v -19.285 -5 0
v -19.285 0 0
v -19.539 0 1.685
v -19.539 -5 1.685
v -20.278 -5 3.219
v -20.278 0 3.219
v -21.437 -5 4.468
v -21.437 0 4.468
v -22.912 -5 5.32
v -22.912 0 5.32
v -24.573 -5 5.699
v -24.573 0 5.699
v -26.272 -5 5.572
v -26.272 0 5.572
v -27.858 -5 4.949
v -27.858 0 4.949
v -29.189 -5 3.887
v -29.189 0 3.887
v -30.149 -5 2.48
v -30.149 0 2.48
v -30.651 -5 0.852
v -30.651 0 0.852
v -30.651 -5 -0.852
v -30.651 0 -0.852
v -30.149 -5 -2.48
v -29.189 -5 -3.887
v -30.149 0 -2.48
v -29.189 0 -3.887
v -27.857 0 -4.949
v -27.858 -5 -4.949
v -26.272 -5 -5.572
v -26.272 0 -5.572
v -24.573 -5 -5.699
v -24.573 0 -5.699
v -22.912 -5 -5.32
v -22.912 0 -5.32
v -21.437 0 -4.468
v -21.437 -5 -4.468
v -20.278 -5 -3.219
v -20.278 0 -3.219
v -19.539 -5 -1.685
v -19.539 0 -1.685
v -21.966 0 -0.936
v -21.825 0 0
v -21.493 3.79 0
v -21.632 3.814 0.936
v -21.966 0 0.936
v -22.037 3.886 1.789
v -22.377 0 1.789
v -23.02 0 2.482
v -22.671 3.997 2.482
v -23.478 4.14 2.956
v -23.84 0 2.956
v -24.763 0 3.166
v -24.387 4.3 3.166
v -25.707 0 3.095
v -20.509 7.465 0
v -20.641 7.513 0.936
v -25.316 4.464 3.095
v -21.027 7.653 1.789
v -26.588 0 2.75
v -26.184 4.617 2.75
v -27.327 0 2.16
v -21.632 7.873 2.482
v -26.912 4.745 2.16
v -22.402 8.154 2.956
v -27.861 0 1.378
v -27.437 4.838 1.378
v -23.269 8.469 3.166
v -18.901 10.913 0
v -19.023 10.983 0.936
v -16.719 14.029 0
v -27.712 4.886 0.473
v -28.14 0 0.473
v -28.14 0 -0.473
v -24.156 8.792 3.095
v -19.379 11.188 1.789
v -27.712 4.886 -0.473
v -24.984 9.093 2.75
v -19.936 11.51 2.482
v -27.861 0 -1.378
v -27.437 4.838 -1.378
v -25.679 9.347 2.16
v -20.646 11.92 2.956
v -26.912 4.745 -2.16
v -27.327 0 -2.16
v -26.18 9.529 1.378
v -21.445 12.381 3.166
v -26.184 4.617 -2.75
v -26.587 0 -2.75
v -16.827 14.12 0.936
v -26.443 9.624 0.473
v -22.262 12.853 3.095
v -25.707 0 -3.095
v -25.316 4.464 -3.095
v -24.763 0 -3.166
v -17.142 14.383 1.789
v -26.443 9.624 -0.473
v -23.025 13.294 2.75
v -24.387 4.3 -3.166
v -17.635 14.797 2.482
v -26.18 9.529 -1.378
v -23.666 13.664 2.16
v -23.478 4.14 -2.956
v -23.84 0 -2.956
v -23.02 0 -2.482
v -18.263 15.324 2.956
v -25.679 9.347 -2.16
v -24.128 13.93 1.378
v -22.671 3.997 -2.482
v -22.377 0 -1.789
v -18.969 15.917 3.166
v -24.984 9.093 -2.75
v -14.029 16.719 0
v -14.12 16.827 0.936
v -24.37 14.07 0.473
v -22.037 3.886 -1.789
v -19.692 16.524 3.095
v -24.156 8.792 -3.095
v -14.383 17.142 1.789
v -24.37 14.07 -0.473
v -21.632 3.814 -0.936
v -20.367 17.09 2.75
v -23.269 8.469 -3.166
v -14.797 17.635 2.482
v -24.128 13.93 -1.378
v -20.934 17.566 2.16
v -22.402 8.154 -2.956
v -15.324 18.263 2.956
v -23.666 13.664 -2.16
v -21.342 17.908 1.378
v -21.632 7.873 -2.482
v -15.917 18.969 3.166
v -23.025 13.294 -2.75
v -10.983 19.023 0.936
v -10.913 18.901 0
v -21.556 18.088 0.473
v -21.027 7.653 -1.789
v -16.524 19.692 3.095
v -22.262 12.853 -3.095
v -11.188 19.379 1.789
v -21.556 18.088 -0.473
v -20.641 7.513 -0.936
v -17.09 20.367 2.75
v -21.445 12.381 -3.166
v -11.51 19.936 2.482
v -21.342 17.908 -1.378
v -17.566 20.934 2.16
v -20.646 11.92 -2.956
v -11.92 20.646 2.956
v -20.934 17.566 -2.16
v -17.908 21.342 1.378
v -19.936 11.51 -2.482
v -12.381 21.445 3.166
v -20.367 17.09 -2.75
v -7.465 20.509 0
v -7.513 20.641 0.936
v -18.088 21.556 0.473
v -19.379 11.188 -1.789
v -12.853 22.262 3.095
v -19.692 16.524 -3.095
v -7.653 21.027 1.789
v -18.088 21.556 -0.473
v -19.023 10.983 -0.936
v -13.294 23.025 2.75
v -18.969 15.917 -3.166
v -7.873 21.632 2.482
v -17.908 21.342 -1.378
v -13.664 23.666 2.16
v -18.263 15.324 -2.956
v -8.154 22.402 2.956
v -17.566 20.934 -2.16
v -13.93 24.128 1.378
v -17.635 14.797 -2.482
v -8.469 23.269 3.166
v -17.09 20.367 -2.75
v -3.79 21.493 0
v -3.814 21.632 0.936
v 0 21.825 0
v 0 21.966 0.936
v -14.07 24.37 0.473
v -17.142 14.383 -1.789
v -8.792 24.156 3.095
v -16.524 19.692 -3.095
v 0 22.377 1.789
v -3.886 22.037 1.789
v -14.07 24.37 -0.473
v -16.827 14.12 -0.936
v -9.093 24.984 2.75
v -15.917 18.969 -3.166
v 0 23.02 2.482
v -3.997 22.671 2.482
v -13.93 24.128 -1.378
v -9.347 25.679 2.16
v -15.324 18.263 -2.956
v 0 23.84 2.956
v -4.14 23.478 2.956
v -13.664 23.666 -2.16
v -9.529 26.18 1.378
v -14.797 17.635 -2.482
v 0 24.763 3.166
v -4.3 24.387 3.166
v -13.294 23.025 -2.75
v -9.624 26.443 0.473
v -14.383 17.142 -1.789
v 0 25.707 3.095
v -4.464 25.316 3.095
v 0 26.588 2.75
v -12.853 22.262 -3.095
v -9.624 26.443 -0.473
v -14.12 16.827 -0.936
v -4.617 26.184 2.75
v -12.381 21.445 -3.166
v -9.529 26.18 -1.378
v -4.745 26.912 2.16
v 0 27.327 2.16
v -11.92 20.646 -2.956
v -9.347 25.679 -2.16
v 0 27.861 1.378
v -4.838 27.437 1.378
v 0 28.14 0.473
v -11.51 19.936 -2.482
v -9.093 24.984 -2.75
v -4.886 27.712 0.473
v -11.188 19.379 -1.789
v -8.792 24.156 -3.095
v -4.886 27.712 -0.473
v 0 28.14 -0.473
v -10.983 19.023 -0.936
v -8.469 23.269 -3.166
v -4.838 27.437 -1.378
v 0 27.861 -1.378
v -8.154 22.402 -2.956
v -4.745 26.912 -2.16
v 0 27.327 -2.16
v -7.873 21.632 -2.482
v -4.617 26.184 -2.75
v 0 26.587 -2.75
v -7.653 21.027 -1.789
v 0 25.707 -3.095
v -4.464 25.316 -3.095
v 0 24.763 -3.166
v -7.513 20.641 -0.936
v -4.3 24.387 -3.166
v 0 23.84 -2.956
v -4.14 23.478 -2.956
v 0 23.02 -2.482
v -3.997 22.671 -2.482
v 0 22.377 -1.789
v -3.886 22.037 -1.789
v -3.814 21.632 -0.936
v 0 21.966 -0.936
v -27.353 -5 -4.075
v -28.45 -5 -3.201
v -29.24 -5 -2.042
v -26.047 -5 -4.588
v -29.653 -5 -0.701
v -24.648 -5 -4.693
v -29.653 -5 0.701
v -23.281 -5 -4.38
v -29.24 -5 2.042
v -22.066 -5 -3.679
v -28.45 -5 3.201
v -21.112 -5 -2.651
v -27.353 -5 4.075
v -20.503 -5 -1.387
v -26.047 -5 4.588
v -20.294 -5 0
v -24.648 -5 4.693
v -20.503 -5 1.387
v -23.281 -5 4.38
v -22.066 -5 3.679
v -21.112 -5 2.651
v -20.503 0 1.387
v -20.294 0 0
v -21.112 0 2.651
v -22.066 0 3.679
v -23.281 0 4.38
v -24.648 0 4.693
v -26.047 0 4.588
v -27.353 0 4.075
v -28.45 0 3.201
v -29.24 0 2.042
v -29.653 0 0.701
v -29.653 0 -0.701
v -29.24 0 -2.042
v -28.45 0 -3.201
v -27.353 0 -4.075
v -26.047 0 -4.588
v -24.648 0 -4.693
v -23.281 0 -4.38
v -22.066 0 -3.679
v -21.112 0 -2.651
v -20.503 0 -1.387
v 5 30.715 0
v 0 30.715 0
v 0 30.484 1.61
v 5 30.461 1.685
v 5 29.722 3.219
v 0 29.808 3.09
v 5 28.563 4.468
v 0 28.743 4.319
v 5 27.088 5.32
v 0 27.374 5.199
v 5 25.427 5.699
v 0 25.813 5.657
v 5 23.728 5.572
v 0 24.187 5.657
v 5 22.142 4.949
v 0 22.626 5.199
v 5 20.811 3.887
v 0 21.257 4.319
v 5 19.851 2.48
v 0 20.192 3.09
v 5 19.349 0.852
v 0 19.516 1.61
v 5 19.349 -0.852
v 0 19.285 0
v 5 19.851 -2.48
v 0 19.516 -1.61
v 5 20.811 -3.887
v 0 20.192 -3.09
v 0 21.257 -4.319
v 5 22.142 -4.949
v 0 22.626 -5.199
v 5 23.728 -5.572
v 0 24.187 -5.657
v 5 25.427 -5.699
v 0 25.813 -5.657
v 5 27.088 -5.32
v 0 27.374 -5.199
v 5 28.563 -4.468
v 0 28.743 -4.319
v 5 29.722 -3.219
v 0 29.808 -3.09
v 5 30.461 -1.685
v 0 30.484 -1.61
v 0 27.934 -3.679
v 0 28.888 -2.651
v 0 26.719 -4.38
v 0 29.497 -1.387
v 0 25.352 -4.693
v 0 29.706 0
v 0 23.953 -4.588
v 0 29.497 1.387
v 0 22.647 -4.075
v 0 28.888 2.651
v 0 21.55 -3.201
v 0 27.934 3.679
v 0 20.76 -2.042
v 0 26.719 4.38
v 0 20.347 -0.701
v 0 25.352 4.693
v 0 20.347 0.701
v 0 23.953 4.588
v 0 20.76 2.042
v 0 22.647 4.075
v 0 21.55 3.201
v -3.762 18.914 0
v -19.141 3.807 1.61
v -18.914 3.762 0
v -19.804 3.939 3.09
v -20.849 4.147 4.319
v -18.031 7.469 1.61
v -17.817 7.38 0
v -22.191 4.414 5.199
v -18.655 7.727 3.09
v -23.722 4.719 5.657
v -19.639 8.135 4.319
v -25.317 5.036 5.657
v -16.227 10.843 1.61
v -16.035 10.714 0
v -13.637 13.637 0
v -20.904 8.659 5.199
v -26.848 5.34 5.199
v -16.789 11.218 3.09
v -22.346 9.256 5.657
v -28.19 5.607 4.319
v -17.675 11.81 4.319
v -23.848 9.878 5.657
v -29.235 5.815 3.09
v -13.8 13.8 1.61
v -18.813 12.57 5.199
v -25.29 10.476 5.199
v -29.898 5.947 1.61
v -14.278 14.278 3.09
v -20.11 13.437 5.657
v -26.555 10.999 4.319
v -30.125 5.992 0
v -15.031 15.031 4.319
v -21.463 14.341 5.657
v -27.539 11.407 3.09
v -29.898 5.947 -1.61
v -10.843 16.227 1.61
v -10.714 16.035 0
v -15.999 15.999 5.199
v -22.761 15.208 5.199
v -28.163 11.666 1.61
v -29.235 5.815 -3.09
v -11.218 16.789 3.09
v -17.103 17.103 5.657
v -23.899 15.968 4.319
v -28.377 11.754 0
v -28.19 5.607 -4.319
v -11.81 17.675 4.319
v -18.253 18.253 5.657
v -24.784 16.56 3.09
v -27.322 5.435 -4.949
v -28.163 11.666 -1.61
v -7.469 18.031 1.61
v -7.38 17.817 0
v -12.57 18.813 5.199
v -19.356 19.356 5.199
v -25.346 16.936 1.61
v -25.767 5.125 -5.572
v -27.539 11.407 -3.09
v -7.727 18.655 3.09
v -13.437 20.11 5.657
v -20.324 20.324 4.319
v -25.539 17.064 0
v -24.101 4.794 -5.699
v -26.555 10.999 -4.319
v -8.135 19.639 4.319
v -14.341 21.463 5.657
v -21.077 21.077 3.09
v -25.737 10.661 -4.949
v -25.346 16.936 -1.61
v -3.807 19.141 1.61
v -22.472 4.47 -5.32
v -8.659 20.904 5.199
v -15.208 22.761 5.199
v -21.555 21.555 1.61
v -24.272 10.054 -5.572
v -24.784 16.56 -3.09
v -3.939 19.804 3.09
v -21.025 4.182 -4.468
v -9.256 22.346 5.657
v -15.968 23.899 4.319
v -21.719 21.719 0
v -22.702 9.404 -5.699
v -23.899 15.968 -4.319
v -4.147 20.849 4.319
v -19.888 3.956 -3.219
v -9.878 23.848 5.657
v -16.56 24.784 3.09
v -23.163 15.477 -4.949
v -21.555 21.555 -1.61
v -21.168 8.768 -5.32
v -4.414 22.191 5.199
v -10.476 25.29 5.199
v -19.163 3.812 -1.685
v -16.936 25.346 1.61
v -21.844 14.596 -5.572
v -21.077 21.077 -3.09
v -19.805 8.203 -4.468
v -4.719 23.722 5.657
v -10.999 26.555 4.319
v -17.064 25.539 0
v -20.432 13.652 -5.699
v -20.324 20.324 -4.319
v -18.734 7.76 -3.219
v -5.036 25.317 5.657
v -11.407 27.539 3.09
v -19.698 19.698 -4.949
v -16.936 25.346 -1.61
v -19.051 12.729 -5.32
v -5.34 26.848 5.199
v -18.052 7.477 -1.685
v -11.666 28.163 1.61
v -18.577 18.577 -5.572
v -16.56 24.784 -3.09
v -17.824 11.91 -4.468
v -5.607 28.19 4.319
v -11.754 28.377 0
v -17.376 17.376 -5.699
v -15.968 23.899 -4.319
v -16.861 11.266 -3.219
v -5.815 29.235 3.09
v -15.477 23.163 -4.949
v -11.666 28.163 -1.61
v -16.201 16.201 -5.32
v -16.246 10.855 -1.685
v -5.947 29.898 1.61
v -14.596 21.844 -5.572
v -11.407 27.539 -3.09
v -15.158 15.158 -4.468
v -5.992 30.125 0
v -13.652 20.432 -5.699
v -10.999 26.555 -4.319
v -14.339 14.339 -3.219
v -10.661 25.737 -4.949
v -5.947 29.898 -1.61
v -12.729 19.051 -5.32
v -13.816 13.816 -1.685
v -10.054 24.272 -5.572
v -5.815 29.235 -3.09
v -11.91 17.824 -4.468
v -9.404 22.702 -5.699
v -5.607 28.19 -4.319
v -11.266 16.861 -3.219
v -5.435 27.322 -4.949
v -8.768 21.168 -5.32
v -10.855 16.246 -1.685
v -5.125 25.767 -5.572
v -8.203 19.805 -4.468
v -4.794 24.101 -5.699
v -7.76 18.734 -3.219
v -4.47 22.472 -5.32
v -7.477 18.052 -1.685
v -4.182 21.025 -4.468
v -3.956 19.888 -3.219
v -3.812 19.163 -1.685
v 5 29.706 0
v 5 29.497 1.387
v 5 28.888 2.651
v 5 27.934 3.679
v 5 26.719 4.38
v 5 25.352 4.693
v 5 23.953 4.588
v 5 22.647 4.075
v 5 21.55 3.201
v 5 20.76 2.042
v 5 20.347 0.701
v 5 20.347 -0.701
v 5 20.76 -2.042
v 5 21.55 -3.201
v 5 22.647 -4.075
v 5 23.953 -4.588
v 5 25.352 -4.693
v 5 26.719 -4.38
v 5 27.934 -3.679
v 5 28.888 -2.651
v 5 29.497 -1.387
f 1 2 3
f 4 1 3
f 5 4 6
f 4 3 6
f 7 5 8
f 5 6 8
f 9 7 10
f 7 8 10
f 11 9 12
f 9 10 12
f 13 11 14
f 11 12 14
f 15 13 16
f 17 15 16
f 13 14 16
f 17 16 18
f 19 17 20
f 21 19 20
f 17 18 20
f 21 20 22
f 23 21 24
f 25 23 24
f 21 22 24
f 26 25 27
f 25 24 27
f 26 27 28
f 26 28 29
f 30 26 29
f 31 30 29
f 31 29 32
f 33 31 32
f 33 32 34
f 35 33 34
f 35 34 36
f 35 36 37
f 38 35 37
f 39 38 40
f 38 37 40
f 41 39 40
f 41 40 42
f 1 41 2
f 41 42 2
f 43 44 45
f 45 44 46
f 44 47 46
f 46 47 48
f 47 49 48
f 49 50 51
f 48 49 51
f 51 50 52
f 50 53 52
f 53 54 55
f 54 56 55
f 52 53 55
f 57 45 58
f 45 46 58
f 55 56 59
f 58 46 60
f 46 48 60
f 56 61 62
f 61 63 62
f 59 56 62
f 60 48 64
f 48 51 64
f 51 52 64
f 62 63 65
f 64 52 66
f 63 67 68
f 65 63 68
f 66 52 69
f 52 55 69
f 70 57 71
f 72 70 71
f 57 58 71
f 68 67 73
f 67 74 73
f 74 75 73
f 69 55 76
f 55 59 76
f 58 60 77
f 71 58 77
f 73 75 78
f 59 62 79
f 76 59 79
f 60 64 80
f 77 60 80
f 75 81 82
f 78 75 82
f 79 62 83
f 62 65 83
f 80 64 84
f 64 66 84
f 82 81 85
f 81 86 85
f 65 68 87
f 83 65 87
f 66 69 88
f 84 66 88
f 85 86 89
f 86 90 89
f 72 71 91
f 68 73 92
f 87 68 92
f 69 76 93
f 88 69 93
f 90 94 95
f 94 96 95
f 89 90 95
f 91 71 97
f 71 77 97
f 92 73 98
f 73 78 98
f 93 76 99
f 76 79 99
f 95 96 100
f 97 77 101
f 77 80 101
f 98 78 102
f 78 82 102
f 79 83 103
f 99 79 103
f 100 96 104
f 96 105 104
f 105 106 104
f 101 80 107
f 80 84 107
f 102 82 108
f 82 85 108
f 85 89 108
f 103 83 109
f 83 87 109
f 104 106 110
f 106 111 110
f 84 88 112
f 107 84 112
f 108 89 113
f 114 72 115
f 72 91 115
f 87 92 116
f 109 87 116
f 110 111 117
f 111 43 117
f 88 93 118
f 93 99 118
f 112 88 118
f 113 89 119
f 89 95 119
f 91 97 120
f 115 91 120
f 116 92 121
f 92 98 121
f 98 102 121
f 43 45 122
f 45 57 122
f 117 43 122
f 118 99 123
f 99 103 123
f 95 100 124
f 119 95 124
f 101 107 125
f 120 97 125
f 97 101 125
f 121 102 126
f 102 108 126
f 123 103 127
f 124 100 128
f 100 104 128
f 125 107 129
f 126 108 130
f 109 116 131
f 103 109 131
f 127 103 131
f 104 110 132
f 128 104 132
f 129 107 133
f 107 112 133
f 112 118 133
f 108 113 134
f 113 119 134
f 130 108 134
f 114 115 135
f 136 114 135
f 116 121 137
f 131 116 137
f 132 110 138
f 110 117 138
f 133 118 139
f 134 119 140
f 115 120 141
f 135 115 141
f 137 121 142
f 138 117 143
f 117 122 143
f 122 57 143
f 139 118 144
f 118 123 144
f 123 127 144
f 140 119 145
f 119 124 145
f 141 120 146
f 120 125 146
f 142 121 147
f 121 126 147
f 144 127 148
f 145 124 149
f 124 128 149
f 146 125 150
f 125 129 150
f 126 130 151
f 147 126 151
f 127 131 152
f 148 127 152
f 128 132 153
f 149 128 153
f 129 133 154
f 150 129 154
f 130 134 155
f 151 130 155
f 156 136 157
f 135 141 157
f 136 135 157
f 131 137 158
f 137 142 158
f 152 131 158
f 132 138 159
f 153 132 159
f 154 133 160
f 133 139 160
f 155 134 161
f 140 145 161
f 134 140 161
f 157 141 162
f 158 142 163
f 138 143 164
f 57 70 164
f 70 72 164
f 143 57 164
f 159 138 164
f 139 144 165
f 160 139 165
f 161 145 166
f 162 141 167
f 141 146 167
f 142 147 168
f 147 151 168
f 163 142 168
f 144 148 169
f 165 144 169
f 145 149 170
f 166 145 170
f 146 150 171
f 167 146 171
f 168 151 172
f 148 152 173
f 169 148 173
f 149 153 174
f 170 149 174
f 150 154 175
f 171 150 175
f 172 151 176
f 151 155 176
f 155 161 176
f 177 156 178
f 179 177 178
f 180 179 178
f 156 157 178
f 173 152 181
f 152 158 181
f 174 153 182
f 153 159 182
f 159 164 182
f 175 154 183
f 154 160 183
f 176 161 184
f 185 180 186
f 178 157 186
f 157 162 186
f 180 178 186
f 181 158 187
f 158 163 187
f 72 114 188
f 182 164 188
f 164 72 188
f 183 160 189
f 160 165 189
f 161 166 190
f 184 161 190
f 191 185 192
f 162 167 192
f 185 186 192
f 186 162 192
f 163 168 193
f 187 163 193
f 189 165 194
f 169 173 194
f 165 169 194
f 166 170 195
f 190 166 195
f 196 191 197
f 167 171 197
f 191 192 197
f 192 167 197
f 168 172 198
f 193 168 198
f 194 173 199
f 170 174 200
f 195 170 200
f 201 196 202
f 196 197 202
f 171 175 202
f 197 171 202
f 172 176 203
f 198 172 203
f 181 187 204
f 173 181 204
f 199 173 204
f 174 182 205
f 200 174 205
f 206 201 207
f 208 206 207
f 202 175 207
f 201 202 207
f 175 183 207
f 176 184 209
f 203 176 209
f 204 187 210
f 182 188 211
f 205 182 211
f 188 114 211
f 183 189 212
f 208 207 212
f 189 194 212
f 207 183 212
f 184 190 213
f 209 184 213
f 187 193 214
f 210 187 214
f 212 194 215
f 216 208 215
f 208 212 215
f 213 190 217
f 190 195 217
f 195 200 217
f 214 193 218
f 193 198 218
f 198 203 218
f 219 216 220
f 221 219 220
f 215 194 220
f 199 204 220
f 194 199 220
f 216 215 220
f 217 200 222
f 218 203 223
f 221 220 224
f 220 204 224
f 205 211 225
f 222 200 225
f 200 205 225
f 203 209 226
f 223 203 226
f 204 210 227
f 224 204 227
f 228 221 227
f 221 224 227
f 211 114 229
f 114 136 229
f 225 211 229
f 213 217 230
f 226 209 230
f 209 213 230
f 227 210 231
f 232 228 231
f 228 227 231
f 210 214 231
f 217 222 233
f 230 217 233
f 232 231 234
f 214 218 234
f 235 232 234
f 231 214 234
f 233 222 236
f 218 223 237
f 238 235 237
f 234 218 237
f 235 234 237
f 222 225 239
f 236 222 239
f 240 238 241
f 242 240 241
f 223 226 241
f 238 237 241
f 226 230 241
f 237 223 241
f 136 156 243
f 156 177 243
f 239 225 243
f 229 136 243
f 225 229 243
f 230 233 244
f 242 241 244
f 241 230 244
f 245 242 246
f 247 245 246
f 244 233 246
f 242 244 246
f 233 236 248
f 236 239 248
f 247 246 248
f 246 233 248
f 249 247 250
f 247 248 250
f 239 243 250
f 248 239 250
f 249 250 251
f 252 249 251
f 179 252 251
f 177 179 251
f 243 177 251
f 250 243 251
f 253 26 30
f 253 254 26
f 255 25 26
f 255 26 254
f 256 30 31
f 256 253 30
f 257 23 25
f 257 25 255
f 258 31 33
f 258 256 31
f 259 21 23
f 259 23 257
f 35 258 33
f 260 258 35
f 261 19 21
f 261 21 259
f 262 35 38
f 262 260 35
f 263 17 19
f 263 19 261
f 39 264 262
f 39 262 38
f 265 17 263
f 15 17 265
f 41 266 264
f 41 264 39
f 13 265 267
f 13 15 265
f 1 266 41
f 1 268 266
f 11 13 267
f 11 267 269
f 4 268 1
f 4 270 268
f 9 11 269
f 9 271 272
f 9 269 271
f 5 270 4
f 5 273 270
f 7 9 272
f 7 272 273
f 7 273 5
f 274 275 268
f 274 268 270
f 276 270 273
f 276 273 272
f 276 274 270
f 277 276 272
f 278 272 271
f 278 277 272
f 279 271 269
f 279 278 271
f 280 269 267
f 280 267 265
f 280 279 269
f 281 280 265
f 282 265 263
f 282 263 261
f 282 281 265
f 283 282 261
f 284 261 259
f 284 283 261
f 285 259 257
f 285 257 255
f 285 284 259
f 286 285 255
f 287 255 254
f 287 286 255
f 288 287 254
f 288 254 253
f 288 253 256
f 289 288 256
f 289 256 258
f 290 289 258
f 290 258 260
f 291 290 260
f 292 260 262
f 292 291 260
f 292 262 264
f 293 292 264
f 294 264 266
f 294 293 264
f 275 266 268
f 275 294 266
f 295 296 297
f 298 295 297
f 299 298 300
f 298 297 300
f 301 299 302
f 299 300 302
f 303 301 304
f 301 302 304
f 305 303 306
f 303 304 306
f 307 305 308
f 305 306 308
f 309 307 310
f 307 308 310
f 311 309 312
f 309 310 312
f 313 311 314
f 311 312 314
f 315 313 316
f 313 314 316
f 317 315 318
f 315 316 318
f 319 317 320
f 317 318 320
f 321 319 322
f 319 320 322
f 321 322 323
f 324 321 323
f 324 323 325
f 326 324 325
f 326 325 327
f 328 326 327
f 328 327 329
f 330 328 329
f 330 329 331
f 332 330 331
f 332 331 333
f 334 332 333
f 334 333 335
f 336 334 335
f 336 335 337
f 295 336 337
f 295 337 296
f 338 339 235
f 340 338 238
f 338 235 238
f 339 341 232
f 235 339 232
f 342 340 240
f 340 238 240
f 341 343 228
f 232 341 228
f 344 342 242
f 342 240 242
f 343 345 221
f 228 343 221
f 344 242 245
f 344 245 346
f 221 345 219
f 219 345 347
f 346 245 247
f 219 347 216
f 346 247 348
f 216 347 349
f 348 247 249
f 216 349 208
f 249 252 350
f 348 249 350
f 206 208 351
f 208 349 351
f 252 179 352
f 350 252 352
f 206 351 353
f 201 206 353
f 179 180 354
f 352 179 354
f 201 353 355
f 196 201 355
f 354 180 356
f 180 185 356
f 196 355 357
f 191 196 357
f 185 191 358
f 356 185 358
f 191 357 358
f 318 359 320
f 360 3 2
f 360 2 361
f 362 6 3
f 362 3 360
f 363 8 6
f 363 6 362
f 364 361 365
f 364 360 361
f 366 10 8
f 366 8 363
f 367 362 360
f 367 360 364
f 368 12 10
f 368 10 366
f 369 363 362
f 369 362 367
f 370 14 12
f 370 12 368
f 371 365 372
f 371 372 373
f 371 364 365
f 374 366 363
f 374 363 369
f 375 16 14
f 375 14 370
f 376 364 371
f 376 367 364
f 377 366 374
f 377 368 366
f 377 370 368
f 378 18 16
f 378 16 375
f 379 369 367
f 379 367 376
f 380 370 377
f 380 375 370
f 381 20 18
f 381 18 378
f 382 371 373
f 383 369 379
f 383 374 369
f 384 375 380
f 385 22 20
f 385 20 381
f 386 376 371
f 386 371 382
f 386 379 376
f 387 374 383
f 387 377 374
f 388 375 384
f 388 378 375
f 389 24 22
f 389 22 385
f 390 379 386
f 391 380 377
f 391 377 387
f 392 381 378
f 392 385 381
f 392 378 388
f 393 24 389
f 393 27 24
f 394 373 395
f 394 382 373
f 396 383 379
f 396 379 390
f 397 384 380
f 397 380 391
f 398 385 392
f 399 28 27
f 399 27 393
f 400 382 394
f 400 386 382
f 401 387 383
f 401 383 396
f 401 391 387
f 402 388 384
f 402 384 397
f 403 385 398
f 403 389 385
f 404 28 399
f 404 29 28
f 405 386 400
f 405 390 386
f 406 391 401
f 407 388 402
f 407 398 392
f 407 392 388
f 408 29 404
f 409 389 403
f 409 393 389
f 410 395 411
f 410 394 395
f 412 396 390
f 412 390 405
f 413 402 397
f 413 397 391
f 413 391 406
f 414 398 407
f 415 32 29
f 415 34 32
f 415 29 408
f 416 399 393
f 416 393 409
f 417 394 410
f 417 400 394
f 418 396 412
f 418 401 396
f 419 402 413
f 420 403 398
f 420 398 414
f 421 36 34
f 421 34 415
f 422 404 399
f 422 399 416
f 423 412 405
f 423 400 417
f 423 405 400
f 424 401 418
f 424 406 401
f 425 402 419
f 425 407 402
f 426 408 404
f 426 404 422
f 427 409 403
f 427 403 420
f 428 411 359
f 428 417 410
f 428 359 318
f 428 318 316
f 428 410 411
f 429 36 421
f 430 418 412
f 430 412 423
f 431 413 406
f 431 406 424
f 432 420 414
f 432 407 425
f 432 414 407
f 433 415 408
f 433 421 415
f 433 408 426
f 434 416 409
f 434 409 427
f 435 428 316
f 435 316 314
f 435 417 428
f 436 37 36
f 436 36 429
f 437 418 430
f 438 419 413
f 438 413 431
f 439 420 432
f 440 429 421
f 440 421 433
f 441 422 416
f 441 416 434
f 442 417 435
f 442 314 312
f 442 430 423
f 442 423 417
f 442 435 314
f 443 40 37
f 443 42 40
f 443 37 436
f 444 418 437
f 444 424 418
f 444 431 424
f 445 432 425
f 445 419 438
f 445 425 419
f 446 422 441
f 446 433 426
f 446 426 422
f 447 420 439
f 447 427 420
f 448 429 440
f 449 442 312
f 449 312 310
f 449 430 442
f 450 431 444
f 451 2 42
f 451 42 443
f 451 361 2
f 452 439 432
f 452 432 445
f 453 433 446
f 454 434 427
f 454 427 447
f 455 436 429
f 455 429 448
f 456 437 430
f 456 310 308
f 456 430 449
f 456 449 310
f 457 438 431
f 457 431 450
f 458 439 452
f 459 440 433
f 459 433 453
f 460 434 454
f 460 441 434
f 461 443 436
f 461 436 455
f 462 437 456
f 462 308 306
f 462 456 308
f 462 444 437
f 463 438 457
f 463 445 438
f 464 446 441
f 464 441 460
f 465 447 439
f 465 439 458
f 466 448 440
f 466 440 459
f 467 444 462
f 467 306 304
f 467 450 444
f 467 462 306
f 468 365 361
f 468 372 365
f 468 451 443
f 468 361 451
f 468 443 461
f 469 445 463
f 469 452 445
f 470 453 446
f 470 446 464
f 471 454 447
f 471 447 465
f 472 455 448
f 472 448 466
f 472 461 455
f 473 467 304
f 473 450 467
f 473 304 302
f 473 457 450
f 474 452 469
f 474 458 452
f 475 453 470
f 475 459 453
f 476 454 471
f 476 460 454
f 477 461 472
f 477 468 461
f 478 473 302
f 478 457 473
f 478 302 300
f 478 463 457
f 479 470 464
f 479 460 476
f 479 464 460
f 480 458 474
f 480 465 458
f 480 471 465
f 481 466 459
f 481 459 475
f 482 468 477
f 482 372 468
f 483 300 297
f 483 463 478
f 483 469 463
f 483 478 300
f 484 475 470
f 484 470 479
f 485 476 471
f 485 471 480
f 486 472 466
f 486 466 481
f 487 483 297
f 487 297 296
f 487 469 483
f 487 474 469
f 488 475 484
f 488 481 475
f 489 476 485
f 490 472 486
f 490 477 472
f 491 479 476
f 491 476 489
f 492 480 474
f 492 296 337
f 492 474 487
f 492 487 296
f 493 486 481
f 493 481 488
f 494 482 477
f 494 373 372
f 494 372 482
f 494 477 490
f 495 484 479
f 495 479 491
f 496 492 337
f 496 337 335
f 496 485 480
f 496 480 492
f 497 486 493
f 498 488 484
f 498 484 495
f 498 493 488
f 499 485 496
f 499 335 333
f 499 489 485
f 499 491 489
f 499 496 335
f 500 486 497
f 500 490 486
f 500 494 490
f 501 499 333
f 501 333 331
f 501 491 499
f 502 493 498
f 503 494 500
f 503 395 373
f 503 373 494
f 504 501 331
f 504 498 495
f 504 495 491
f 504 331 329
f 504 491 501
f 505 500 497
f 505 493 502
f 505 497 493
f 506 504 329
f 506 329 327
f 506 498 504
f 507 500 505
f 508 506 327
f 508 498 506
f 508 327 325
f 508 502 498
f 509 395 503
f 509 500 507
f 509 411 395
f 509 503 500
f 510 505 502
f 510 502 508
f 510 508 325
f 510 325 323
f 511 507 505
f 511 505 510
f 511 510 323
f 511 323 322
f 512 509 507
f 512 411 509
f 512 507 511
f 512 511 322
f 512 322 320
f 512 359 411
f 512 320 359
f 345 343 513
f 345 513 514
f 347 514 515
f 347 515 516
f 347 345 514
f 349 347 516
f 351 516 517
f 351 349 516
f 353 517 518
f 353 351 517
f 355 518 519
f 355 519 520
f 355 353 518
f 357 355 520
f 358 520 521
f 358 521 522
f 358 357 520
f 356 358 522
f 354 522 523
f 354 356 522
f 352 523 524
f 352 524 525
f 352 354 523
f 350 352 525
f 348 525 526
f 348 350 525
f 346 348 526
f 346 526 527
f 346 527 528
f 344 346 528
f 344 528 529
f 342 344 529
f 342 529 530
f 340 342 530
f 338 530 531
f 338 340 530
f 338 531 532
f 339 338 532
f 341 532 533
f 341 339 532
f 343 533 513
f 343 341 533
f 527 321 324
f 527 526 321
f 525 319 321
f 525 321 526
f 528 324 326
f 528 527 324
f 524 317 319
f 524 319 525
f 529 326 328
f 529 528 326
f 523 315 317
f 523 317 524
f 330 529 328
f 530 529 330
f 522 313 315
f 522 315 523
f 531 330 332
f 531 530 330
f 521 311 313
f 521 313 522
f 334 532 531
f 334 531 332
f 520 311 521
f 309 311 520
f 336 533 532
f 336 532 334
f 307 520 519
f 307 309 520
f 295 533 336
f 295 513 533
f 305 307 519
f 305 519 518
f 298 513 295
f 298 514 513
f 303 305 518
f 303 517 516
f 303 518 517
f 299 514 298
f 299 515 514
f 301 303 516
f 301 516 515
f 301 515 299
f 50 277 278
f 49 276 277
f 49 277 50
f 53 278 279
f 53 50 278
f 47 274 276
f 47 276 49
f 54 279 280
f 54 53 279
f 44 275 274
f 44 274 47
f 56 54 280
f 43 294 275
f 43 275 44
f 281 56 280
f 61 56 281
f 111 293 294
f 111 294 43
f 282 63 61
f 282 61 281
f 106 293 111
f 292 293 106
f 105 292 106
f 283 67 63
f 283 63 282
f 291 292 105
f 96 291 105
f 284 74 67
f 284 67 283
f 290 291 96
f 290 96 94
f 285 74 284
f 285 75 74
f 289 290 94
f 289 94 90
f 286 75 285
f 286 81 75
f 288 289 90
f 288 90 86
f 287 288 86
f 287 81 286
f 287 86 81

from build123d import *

# Parameters (mm, degrees)
F1_R     = 5.715
F1_R_2   = 3.175
F3_R     = 5.715
F3_R_2   = 4.70576
F4_DEPTH = 5
F5_R     = 5.715
F5_R_2   = 4.70576
F6_DEPTH = 5


with BuildPart() as f2:
    # F2: sweep along a path in F0
    with BuildLine(Plane.XY) as f2_path:
        ThreePointArc((-25, 0), (-17.6776695297, 17.6776695297), (0, 25))
    # F1 (on Front) → F2 (sweep)
    with BuildSketch(Plane.XZ):
        with Locations((-25, 0)):
            Circle(F1_R)
        with Locations((-25, 0)):
            Circle(F1_R_2, mode=Mode.SUBTRACT)
    sweep(path=f2_path.line)

    # F3 (on face) → F4 (join)
    with BuildSketch(Plane.XZ):
        with Locations((-25, 0)):
            Circle(F3_R)
        with Locations((-25, 0)):
            Circle(F3_R_2, mode=Mode.SUBTRACT)
    extrude(amount=F4_DEPTH)

    # F5 (on face) → F6 (join)
    with BuildSketch(Plane.YZ):
        with Locations((25, 0)):
            Circle(F5_R)
        with Locations((25, 0)):
            Circle(F5_R_2, mode=Mode.SUBTRACT)
    extrude(amount=F6_DEPTH)


solid = f2.part
